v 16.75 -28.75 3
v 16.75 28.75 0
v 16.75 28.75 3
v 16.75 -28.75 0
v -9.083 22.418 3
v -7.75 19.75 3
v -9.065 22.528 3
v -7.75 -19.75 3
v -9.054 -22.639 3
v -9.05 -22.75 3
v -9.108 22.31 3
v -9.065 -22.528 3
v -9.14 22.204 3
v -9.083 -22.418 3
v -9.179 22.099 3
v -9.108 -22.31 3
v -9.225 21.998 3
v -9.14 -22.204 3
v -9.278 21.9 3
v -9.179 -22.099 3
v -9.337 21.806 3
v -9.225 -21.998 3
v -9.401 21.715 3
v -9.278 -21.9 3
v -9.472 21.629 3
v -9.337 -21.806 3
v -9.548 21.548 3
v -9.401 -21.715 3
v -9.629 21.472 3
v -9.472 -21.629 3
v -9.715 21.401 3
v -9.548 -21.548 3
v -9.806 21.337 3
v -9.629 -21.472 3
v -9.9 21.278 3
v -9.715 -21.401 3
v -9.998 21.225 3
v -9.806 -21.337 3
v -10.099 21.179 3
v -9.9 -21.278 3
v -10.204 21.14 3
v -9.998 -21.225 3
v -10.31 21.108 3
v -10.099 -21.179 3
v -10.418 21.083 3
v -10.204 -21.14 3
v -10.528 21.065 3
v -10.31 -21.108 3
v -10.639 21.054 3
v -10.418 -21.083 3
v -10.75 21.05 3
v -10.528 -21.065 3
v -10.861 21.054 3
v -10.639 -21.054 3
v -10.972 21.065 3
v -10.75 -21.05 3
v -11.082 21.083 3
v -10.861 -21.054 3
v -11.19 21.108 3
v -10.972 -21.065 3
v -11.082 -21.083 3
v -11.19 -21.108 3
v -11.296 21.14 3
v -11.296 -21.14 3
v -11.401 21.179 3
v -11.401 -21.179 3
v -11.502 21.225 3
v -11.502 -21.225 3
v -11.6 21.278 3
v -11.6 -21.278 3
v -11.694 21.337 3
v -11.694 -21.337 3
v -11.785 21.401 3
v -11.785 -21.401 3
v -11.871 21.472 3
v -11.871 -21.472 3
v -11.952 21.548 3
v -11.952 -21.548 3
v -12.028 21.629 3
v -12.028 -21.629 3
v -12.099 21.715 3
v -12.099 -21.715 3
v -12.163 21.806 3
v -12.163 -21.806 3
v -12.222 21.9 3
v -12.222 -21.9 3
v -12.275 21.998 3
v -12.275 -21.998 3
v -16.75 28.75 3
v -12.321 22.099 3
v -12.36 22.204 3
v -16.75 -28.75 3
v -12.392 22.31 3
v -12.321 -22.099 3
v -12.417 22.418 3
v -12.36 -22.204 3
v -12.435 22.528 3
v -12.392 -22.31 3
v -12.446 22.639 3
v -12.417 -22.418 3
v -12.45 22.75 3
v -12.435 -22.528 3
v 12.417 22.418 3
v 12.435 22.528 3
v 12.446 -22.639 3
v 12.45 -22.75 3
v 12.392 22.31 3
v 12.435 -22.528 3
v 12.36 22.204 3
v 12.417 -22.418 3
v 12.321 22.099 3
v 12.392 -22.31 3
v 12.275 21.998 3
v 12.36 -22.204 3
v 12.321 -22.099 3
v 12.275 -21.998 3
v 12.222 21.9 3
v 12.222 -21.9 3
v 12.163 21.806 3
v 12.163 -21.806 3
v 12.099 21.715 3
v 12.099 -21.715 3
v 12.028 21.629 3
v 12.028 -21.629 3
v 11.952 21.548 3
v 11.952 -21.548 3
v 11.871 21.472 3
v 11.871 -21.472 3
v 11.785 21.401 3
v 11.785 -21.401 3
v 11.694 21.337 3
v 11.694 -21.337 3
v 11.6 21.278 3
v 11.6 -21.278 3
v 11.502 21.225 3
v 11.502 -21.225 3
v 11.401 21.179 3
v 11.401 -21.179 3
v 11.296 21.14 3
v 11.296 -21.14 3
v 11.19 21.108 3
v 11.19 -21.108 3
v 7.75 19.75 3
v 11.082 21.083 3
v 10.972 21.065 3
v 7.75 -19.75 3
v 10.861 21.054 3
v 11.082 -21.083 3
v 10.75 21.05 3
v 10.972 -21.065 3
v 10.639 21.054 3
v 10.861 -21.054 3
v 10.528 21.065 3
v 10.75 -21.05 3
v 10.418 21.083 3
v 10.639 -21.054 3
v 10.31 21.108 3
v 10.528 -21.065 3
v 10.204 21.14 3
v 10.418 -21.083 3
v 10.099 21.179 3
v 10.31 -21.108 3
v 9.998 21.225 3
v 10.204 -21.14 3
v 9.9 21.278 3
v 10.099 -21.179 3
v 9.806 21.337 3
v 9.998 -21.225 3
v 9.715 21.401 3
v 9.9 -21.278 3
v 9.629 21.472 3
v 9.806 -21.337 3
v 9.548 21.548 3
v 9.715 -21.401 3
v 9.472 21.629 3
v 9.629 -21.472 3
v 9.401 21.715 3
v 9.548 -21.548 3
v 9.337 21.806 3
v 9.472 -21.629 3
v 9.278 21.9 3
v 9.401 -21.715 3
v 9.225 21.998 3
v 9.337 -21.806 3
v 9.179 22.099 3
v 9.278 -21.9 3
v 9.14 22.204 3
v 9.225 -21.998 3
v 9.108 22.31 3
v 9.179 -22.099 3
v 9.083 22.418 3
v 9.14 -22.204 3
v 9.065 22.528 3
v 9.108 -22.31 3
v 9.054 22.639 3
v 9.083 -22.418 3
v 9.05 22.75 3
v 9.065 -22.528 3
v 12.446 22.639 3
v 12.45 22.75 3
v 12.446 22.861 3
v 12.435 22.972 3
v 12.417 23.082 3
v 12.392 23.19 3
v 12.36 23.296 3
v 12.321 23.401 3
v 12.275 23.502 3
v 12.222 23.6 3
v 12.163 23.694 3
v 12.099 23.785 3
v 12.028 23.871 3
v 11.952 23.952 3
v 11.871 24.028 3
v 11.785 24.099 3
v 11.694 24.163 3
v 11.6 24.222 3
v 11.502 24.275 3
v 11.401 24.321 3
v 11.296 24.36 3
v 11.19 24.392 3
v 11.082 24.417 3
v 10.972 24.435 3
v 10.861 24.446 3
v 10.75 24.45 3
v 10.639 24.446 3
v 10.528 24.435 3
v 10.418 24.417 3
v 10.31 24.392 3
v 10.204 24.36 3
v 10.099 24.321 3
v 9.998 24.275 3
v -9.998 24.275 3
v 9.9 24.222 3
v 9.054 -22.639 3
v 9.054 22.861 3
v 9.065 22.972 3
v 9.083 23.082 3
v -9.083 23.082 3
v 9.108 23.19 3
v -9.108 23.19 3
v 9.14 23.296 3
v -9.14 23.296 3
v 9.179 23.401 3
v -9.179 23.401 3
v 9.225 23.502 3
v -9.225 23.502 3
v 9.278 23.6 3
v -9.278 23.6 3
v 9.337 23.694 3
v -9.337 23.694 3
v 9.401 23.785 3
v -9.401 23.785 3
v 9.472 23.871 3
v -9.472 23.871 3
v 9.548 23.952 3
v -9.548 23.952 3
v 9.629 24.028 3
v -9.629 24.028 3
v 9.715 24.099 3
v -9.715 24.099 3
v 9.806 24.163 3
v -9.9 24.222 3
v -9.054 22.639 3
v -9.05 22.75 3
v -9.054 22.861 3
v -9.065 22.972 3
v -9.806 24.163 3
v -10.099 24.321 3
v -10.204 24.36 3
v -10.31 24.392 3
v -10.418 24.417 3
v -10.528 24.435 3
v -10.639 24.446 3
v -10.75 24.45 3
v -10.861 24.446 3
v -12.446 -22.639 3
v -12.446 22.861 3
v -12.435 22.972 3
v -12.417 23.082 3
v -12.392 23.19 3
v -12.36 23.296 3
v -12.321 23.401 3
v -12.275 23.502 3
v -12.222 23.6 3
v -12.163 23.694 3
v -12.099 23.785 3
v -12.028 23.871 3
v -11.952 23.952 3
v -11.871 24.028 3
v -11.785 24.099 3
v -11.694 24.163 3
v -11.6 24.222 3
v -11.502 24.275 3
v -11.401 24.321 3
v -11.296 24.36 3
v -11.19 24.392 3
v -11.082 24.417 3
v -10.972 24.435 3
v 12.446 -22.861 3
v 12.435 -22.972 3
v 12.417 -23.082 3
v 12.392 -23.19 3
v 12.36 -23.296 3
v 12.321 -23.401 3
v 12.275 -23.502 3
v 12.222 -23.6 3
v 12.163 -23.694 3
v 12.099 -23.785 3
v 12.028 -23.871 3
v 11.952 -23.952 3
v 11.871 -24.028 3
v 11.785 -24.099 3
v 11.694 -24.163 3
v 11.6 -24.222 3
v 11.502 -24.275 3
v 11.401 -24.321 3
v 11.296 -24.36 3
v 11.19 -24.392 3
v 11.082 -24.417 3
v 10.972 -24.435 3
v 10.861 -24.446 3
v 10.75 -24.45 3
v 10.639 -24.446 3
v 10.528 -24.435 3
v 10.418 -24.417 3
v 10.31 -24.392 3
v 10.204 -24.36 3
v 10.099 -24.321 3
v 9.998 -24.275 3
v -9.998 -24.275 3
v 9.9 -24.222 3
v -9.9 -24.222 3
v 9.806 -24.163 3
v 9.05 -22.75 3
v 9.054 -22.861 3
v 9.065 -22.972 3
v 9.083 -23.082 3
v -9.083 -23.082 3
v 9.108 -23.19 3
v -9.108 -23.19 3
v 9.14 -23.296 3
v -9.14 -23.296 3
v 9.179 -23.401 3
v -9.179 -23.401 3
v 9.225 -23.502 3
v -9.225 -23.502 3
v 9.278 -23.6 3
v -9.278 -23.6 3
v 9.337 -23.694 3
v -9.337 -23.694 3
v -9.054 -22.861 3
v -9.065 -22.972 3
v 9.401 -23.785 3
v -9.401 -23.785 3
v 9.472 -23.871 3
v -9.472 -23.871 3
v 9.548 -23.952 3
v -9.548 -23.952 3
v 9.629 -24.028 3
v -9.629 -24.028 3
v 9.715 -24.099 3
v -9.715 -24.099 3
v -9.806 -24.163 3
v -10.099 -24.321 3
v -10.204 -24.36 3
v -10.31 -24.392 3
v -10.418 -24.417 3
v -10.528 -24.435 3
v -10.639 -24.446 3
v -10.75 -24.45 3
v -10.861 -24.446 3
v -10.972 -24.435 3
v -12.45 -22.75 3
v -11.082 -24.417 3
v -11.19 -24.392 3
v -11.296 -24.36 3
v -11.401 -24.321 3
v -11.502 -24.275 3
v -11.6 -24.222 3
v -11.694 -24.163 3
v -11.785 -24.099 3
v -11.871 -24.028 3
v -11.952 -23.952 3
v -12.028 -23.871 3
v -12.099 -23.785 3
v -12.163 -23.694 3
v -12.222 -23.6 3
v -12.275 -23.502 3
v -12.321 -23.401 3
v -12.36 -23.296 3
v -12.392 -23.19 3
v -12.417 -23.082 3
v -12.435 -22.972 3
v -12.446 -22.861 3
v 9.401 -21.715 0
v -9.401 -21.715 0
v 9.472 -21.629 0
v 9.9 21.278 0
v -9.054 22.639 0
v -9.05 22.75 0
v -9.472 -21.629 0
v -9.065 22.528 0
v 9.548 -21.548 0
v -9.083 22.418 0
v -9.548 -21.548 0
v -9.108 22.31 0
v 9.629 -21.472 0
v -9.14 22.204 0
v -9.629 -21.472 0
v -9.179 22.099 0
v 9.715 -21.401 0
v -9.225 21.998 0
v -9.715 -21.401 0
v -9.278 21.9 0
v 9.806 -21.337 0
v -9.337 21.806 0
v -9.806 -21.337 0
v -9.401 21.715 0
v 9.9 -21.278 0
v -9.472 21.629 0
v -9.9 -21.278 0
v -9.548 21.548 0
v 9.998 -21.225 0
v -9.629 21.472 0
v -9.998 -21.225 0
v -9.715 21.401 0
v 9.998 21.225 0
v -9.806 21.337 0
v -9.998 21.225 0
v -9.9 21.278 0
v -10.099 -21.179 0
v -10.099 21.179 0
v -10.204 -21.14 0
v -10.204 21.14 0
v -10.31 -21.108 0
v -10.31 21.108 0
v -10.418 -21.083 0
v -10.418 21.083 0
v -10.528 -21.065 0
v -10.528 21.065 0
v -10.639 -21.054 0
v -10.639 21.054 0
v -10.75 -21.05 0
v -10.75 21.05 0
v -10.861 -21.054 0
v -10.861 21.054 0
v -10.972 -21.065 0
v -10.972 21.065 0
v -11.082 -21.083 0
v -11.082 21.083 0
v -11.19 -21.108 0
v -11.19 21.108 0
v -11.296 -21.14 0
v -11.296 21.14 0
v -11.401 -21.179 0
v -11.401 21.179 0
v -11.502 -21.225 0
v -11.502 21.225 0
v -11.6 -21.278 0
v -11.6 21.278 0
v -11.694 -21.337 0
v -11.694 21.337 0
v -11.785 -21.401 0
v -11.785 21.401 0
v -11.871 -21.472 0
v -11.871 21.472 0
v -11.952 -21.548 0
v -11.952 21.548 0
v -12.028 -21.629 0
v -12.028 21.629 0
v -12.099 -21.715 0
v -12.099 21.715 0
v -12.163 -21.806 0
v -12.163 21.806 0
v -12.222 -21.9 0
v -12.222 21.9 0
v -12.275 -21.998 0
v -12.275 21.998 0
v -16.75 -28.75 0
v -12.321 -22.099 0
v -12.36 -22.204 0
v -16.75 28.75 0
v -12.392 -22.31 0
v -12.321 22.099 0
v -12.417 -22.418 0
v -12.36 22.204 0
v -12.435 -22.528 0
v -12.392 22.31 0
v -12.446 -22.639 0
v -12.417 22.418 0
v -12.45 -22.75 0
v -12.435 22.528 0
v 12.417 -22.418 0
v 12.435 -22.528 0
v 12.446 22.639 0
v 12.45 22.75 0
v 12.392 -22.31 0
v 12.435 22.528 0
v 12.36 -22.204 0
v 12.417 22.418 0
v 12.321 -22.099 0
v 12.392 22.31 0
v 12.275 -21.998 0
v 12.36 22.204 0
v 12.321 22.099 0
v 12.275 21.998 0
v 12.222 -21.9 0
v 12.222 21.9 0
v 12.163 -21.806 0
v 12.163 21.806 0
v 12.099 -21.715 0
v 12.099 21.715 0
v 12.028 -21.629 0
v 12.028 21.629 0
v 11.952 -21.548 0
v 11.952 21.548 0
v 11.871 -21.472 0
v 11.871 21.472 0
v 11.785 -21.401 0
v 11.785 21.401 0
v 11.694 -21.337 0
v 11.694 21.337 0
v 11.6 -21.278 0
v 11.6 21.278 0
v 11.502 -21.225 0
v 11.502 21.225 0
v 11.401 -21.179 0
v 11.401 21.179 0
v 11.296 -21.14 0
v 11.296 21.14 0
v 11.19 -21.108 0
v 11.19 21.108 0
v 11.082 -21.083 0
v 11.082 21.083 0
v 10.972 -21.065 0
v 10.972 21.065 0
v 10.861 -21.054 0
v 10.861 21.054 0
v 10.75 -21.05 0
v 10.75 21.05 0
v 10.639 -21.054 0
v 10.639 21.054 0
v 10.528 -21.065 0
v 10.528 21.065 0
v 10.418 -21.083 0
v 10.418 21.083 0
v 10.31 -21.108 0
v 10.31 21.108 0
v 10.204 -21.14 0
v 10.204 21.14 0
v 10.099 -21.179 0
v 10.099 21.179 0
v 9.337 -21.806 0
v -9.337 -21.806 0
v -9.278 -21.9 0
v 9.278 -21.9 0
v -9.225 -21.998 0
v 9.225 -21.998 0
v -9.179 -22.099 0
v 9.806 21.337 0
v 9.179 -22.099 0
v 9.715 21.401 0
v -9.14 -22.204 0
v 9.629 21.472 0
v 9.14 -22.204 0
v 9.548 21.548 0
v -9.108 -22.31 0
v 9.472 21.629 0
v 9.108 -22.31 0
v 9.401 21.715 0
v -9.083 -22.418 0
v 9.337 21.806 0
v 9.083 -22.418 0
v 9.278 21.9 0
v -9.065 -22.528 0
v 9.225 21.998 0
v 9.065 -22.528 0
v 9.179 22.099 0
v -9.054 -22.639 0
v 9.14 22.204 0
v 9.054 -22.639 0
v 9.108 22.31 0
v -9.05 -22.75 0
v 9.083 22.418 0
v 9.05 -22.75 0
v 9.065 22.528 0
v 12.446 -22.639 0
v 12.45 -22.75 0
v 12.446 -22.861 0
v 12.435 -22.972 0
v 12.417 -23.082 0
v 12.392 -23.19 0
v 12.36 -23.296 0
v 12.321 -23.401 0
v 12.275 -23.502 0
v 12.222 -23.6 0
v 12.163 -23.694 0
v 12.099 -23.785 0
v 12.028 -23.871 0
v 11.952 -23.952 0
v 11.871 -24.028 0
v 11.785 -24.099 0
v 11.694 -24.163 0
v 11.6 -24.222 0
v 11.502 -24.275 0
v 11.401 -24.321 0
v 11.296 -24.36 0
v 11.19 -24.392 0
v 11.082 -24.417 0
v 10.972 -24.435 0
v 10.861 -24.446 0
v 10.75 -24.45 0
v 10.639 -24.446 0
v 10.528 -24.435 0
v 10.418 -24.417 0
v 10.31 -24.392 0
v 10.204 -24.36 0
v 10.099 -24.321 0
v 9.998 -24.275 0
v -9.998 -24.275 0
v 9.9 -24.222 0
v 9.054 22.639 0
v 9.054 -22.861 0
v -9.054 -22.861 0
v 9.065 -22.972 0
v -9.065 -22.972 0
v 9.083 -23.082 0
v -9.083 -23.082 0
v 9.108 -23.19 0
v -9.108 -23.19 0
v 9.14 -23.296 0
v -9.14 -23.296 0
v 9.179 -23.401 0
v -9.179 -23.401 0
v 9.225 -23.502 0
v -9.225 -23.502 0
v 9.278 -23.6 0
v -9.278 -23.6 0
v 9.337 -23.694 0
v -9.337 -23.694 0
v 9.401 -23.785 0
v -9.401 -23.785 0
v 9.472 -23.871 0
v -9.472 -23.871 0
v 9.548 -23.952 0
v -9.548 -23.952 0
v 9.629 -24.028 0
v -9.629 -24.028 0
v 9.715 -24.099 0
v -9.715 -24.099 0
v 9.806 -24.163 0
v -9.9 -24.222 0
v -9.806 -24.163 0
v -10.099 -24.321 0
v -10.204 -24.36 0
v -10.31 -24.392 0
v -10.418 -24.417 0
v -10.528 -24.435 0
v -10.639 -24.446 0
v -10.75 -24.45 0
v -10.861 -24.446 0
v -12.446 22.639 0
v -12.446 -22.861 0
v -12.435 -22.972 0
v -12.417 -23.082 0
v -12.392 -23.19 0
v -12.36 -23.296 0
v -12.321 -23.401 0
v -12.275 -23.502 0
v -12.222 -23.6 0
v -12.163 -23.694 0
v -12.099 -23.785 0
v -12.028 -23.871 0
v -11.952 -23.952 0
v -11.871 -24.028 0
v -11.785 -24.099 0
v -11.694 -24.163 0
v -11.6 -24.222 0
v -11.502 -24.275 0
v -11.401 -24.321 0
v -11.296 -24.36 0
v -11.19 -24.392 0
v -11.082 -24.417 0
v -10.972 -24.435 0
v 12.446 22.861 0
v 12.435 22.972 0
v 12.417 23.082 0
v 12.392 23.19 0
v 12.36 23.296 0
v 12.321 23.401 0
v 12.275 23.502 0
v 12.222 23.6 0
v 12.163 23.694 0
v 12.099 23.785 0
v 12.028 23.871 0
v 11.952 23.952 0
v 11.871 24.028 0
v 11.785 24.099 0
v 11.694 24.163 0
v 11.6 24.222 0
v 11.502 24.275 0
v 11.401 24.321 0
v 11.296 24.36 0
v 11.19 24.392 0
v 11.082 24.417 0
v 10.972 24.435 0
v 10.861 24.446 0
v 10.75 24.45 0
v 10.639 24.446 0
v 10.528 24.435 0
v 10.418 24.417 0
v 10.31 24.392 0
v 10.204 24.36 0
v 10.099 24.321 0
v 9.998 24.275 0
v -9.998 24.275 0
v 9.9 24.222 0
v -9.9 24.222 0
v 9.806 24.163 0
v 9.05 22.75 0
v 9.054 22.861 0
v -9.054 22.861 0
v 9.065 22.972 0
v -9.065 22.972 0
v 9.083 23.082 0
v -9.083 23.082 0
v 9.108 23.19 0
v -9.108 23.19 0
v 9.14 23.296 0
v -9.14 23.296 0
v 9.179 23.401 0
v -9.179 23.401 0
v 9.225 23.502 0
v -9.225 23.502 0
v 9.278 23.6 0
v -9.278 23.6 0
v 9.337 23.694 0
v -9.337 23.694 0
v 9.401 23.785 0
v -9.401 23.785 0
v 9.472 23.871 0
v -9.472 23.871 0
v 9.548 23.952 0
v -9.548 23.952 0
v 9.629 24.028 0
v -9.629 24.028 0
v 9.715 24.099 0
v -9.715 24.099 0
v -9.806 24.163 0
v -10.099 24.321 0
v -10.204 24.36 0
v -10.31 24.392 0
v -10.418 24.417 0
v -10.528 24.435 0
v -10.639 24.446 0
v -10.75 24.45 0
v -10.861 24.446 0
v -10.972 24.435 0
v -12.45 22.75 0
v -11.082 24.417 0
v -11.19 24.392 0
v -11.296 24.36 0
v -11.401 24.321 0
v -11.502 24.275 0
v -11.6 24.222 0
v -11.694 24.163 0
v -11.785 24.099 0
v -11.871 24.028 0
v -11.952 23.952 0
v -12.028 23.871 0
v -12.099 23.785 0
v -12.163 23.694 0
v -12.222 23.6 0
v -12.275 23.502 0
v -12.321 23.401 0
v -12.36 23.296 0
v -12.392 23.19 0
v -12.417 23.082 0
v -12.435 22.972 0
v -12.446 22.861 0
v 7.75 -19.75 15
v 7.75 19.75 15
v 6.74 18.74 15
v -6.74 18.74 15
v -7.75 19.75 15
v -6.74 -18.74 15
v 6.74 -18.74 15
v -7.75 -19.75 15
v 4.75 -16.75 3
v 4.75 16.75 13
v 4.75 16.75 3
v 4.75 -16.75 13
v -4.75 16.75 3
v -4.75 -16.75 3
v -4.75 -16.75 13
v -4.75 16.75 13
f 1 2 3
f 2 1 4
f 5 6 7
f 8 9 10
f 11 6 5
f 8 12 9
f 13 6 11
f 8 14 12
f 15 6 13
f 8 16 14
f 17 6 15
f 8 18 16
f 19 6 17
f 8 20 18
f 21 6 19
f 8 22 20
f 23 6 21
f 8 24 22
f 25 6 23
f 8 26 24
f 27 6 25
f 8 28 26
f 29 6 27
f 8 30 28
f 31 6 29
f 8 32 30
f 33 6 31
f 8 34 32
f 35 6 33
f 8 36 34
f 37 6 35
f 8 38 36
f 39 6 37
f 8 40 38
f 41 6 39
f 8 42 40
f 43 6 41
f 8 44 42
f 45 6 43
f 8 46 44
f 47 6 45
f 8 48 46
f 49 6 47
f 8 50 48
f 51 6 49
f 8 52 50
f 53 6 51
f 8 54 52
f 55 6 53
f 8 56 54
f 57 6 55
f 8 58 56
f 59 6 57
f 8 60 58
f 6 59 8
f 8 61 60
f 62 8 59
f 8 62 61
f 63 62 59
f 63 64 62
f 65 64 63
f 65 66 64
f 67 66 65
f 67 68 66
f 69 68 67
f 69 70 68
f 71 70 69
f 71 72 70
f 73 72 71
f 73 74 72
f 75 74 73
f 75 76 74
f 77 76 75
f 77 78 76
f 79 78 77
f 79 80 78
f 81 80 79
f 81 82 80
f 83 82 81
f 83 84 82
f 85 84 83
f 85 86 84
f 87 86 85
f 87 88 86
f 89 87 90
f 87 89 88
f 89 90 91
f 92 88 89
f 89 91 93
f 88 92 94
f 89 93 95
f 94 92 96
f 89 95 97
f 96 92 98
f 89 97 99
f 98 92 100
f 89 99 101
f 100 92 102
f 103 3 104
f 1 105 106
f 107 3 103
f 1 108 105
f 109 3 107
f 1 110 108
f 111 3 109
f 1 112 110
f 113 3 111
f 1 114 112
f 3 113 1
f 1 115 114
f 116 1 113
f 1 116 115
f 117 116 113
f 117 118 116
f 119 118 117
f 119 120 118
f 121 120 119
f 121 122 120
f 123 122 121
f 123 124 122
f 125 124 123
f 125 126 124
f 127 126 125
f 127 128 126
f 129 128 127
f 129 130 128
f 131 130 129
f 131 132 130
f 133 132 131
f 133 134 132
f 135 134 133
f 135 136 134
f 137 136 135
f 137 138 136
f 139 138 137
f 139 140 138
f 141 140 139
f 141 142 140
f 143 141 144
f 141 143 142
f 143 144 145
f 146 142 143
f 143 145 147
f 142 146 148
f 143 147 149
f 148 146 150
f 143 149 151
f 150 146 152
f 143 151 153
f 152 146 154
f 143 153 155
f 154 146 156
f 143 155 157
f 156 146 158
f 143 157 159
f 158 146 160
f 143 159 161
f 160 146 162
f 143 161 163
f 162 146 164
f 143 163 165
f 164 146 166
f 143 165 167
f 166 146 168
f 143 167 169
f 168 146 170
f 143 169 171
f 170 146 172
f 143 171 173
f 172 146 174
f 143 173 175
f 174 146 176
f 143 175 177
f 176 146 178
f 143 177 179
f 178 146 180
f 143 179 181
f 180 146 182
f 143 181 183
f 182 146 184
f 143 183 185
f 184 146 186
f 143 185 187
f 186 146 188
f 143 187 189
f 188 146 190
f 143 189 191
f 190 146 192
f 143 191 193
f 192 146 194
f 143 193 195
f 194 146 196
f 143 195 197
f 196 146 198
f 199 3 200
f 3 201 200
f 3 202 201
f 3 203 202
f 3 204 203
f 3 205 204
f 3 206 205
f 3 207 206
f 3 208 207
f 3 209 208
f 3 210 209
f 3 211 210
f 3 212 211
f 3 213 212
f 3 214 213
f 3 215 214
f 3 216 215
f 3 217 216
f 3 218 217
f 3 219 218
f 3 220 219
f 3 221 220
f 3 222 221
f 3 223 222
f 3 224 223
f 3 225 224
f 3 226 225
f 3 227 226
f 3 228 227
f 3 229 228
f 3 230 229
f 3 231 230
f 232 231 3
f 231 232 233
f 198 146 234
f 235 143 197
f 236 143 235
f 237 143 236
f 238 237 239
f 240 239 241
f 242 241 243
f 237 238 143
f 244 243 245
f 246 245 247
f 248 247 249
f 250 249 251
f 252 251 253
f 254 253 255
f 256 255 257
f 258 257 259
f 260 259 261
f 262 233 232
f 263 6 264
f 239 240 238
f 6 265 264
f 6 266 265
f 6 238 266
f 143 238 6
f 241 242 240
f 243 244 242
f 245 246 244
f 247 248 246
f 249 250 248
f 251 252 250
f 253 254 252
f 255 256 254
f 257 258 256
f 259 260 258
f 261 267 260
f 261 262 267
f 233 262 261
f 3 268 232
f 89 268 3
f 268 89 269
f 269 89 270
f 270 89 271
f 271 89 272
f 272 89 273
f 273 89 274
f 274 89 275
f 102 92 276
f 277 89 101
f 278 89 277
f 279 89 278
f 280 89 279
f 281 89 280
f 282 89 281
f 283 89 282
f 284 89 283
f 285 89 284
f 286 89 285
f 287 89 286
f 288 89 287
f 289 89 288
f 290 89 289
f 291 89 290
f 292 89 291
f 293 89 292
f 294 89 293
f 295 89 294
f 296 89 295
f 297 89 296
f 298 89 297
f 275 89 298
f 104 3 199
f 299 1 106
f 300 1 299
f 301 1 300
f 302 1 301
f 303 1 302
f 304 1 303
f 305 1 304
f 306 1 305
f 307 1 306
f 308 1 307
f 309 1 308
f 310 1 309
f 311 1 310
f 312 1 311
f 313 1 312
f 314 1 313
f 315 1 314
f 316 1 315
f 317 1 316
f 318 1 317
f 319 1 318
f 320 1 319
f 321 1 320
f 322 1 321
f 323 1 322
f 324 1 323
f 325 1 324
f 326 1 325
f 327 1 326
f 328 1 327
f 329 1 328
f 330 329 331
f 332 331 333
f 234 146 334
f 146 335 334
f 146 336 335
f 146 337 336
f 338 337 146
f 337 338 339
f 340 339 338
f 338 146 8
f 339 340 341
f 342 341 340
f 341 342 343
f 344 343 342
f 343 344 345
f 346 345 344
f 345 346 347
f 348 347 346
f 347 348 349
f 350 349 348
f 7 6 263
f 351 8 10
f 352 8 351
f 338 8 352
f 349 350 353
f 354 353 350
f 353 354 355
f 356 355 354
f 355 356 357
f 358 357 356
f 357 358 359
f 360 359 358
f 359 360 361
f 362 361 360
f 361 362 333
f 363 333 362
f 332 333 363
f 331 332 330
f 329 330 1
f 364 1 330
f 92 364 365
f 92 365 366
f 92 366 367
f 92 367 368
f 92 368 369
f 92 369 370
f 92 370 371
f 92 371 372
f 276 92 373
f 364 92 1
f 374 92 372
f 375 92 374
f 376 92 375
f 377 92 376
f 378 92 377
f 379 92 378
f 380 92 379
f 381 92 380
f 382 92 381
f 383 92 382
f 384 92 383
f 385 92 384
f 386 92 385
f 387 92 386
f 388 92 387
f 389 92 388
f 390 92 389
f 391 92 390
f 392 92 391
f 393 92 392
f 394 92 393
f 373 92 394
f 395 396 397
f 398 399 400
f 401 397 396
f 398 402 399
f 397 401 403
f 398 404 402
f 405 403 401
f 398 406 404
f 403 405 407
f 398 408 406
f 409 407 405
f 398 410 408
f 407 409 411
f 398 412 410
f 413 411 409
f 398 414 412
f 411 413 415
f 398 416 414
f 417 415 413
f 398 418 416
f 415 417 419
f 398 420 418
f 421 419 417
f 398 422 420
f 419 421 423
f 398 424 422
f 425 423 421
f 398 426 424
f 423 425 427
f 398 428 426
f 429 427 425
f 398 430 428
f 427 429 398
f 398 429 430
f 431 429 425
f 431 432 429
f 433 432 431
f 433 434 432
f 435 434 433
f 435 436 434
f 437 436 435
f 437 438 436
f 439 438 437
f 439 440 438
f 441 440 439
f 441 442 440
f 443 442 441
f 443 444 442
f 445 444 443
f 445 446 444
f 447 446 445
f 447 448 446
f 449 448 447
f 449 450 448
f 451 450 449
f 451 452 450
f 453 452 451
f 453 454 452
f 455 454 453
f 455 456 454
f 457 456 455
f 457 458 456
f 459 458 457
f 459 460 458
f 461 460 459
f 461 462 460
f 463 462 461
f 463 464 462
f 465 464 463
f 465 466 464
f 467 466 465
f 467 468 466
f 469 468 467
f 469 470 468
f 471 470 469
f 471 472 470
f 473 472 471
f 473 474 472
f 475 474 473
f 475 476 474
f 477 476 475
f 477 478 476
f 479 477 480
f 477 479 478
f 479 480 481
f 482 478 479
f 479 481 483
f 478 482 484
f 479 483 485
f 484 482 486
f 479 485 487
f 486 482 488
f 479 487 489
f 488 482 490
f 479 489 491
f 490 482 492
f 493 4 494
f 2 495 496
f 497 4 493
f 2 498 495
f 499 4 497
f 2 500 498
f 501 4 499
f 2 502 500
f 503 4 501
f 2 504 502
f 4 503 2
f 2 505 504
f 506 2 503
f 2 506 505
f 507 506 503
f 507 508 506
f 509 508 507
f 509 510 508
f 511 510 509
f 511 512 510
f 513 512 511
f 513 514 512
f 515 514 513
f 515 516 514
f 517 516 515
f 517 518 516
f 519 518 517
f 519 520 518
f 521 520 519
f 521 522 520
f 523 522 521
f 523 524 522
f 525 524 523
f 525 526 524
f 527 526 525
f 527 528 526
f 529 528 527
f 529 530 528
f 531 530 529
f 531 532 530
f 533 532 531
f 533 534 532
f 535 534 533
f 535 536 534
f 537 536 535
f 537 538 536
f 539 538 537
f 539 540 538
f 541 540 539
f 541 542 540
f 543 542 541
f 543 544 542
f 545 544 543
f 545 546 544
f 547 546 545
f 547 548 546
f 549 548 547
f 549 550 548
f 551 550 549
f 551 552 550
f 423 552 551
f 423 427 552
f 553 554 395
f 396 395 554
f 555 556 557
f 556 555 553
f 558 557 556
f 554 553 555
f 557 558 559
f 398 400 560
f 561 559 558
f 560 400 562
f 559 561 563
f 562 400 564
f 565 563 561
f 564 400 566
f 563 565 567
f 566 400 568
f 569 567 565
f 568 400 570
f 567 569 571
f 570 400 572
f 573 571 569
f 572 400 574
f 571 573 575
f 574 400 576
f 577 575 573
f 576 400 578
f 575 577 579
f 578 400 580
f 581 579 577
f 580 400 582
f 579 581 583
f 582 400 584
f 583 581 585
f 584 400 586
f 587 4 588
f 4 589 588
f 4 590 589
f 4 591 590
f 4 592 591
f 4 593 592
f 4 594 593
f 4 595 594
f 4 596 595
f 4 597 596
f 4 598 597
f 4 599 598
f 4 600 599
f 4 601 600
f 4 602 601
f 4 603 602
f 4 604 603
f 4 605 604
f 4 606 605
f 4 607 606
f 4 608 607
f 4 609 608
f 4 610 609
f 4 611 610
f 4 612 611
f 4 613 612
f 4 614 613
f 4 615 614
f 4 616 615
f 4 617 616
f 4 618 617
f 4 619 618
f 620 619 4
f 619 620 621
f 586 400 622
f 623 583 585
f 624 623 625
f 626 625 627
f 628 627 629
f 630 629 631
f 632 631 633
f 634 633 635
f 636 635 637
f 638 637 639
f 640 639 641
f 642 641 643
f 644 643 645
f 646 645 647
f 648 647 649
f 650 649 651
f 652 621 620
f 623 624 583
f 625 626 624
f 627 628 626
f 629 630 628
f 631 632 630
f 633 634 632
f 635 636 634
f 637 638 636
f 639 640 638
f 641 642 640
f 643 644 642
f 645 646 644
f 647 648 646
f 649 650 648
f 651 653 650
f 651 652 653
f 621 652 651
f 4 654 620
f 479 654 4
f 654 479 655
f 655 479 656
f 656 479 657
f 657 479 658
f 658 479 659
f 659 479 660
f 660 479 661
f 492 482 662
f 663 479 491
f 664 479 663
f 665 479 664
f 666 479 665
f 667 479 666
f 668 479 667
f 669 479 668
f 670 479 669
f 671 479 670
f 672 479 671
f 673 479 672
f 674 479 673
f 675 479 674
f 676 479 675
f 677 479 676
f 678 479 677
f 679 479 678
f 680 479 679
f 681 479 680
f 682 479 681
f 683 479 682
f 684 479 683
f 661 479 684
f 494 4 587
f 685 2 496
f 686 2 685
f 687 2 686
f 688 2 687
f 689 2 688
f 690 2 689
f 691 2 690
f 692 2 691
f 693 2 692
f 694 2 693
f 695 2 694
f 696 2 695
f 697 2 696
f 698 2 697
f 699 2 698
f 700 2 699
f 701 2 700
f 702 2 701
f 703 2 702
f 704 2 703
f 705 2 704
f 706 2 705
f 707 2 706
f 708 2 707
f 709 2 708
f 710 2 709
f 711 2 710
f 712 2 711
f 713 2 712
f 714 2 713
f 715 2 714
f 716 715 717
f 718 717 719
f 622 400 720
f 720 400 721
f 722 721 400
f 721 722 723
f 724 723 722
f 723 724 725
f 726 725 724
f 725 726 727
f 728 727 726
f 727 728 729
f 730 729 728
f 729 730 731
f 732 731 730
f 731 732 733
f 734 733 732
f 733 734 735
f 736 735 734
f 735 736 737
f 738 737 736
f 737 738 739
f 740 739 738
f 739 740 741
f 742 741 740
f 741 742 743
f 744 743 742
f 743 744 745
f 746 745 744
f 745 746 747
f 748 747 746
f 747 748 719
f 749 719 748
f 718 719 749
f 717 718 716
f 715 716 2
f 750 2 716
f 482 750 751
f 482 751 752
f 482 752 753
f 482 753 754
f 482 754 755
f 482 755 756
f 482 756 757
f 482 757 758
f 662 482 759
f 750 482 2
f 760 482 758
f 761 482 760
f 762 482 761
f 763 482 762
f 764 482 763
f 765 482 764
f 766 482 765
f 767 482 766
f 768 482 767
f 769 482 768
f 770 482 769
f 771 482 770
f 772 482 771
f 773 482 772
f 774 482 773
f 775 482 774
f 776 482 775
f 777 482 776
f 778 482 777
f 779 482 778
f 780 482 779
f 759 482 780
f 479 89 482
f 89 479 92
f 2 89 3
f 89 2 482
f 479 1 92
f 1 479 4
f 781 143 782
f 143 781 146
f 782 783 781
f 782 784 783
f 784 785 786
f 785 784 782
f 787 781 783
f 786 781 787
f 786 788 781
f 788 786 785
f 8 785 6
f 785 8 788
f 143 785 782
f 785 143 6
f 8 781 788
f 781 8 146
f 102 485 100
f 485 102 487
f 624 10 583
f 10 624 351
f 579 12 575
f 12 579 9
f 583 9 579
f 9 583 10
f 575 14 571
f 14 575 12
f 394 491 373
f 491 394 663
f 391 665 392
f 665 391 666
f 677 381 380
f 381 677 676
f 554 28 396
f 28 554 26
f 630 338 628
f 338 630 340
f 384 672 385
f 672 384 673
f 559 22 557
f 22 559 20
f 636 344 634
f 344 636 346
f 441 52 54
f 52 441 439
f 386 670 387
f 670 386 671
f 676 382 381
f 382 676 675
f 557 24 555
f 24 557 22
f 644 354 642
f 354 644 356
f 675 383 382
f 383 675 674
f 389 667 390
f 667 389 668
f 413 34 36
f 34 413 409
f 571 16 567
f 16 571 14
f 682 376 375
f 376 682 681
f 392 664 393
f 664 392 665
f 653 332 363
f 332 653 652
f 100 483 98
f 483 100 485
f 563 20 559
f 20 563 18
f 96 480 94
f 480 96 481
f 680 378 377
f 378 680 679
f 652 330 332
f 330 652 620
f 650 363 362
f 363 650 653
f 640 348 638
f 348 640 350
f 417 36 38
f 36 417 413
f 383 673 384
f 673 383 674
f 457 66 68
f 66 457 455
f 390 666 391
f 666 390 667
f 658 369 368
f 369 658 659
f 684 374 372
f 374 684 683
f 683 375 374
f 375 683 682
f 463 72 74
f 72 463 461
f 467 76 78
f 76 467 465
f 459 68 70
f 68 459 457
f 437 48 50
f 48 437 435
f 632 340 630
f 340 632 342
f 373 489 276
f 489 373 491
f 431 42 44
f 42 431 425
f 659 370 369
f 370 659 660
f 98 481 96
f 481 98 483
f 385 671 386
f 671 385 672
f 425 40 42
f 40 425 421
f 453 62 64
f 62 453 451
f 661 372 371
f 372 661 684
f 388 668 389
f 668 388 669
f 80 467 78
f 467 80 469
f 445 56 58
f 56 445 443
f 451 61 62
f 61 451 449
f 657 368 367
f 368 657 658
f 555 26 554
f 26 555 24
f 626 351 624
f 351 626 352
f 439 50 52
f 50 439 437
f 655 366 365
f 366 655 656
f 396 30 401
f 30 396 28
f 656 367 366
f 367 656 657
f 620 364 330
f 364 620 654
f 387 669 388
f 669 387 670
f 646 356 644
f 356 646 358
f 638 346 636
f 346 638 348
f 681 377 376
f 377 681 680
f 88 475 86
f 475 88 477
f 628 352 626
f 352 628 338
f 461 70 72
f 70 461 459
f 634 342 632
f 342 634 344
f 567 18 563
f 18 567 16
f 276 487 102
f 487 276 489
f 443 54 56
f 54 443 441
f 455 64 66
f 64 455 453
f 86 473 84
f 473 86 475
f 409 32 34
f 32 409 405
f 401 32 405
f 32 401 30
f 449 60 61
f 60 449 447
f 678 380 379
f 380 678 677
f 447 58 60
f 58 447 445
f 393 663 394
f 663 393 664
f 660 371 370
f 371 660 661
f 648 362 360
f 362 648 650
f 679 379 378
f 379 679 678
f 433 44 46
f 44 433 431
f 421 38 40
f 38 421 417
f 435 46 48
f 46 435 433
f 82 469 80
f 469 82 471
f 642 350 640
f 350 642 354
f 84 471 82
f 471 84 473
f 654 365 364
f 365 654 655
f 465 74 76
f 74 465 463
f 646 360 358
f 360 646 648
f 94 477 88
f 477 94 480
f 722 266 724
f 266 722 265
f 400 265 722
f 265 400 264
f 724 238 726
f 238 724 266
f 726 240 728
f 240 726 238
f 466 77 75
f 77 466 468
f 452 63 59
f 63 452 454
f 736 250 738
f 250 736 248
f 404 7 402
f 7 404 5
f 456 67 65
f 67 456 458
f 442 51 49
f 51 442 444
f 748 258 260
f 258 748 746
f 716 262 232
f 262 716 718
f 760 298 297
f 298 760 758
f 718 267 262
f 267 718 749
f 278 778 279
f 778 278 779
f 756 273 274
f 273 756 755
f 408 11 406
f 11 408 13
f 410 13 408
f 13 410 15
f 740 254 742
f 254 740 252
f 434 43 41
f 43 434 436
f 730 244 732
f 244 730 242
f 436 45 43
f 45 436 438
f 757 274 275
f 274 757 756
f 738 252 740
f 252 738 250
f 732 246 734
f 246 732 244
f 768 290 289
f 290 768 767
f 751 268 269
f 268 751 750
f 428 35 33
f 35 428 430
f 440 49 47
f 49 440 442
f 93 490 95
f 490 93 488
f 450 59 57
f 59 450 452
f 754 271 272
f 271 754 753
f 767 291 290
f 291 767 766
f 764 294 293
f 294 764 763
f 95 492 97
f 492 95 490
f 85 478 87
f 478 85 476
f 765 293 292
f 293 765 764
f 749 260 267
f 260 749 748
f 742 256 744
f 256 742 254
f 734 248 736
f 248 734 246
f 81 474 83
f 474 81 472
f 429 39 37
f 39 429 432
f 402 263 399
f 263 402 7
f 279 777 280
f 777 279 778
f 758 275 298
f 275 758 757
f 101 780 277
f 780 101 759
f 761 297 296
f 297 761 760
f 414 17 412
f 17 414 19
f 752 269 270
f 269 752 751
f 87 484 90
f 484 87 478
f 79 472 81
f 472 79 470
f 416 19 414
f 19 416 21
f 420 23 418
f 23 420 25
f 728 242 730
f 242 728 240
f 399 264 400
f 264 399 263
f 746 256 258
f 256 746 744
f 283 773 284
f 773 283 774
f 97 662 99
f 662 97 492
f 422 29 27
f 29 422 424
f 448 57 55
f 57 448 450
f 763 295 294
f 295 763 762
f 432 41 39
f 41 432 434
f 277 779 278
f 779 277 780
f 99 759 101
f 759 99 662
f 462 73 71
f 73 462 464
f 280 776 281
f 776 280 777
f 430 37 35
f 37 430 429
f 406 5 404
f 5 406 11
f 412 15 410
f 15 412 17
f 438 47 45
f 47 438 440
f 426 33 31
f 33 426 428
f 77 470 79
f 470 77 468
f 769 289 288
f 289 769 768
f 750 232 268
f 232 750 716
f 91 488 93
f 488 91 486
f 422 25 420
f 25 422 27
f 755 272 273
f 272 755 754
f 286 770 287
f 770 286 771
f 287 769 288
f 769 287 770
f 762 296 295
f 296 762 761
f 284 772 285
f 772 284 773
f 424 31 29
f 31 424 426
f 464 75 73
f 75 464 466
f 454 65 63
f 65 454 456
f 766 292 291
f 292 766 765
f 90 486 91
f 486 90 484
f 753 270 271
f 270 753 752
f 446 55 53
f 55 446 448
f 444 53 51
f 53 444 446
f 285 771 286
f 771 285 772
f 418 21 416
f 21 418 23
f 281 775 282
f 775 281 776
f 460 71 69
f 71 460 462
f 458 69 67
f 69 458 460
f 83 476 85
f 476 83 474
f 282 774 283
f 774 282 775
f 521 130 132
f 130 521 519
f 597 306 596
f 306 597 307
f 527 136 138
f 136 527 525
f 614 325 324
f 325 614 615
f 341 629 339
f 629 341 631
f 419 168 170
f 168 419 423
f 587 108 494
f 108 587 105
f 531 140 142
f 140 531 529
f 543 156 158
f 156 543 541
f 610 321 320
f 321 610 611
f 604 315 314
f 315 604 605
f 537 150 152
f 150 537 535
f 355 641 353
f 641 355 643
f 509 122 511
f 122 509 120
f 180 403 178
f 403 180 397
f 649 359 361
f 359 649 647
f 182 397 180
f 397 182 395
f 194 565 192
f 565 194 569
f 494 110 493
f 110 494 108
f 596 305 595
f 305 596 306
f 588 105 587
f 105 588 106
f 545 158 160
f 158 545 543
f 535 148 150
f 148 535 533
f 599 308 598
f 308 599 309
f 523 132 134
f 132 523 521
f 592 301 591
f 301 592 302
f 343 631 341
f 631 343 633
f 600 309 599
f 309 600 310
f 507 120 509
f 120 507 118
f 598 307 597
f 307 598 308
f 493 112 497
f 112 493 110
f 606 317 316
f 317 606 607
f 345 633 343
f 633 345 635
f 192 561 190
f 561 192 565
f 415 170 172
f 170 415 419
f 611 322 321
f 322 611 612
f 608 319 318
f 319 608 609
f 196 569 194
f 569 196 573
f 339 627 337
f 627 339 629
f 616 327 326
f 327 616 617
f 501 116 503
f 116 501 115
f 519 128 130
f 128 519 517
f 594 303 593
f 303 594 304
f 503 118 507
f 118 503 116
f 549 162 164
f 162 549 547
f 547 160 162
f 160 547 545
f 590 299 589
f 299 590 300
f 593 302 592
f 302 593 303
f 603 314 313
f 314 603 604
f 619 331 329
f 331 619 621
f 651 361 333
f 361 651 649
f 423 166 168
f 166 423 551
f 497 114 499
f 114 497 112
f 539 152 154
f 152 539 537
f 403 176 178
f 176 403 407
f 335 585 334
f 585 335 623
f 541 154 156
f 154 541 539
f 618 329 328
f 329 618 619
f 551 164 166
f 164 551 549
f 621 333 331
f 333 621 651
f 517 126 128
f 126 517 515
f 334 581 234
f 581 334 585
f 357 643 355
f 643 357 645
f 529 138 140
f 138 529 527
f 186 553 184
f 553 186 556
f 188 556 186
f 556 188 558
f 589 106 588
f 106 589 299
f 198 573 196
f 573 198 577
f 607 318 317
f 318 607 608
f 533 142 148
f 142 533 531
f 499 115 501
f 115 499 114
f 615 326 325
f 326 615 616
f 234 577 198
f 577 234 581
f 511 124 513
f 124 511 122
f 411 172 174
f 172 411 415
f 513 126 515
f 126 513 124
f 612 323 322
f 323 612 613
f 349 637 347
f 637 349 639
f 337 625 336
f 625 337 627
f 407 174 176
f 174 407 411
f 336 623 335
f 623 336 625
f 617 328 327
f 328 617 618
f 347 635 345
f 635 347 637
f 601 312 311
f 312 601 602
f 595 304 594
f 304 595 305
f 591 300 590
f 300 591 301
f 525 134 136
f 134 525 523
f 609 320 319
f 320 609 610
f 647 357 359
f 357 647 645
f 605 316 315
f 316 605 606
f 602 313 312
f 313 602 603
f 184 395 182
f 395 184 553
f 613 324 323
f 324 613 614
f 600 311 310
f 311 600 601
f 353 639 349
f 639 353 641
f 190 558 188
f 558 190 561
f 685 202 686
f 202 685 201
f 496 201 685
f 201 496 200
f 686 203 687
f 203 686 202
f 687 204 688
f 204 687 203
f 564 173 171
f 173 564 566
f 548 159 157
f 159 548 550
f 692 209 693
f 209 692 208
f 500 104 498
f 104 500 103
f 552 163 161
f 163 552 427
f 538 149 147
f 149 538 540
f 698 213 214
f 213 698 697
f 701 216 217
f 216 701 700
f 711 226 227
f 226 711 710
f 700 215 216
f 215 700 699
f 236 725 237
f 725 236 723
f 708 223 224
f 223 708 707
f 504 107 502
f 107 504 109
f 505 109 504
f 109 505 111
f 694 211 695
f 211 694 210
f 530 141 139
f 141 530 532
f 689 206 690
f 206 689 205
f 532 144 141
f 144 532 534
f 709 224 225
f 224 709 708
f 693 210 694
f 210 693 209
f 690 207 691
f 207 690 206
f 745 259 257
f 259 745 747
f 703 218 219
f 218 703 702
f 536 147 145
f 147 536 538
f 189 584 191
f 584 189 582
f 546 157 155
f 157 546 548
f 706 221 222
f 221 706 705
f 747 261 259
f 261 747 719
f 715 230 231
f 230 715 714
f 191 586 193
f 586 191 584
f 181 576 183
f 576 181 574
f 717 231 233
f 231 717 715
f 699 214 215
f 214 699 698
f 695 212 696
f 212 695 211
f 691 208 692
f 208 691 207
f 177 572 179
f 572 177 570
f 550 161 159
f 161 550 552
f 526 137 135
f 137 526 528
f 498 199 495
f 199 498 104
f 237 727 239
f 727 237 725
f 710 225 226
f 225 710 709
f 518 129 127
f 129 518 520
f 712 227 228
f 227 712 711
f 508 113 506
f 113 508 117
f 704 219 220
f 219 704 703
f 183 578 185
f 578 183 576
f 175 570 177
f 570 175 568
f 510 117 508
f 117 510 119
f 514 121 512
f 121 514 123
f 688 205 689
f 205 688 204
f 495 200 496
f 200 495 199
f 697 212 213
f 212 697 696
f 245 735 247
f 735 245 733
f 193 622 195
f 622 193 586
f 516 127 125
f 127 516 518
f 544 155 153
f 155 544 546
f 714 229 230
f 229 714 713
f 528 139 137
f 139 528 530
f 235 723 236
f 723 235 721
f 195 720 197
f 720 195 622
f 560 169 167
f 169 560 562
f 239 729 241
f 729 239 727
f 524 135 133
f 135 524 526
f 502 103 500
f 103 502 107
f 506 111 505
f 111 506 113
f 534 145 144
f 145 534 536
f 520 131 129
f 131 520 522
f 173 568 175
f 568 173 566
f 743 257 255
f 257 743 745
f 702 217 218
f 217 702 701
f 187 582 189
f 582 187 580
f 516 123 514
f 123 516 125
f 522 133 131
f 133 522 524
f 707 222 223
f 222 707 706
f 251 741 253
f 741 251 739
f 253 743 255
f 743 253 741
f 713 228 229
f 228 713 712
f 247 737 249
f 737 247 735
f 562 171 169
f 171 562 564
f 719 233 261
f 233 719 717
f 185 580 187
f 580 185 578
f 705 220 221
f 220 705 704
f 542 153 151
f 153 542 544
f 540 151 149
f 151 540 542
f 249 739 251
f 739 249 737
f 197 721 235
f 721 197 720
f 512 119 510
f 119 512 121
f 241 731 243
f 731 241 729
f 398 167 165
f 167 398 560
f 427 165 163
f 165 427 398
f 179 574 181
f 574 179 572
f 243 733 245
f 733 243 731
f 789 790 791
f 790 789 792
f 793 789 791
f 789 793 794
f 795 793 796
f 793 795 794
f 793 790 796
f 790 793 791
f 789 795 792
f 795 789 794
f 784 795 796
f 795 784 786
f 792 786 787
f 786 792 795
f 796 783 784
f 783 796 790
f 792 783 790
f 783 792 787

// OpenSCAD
// =============================================================
//  connect_four_piece_edge_nest.scad
//  Stage-1 "edge nest" piece holder for the Connect Four robot arm
//
//  WHY THIS EXISTS (vs. the other fixtures in this folder)
//  -------------------------------------------------------
//  tray / chute / magazine all hold the disc FLAT and grip its RIM,
//  which leaves the disc horizontal after pickup -> a 90 deg wrist
//  rotation is then needed to drop it into a vertical board slot
//  (the "wrist rotation direction" question parked in column_mover.py).
//
//  This nest holds ONE disc STANDING ON EDGE. The gripper descends
//  from straight above and clamps the two flat faces across the
//  8.5 mm thickness (the "narrow" grip). The disc comes up already
//  vertical, hanging edge-down, and drops straight into the column.
//  No reorientation.
//
//        gripper jaws close along X (across the 8.5 mm thickness)
//                 │            │
//                 ▼            ▼
//              ┌────┐  ●●●  ┌────┐    ● = exposed upper faces (grip here)
//              │    │ ●███● │    │
//   side walls │    │ █████ │    │    cradle only the LOWER ~12 mm so the
//   (cut low)  └────┘ █████ └────┘    jaws clear the walls
//   ───────────────────────────────  floor (disc rests on its edge here)
//
//  STAGE 1 = THIS FILE: a single nest, hand-reloaded between episodes.
//  Fixed pickup pose -> ideal for recording the first ACT dataset.
//  STAGE 2 (later): bolt an inclined feed channel onto the back so the
//  next disc auto-feeds. Parameters here are named to make that easy.
//
//  HOW TO USE
//  ----------
//  1. Open in OpenSCAD. F5 (preview) — read the echoed footprint,
//     grip-exposure, and pickup-pose numbers in the console.
//  2. F6 (render) -> File > Export > Export as STL.
//  3. Print in PLA. Print "as drawn" (open side up) — no supports
//     needed; the chamfers are self-supporting at 45 deg.
//  4. Bolt to the bench through the 4 mounting holes. A fixed XY/Z
//     pose is critical: you teach the pickup pose ONCE, then every
//     recorded episode reuses it.
//
//  ORIENTATION ON THE BENCH
//  ------------------------
//  The gripper closes along X. Set the nest so X is PERPENDICULAR to
//  the Connect Four board face — then the lifted disc's plane is
//  already parallel to the board slot and no wrist roll is required
//  between pick and place.
//
//  DISC DIMENSIONS: measured 2026-05-01 (see connect_four_piece_tray.scad)
// =============================================================

/* ── USER PARAMETERS ──────────────────────────────────────── */

// Measured disc (calipers). Update if your set differs.
piece_d        = 32.0;   // disc diameter  (mm)
piece_t        = 8.5;    // disc thickness (mm)  <- this is the gripped dimension

// Slot fit
slot_clearance = 1.0;    // TOTAL extra across thickness (0.5 mm/side).
                         // Tight on purpose: disc must stand vertical and
                         // land in a repeatable pose. Loosen to ~1.5 if
                         // your printer runs tight and the disc binds.
diam_clearance = 1.5;    // TOTAL extra along the diameter (front/back),
                         // so the disc drops in without jamming.

// Cradle / walls
cradle_h       = 12.0;   // how high the walls hug the disc (mm).
                         // MUST stay well below piece_d so the upper faces
                         // are exposed for the jaws. See grip-exposure echo.
wall_t         = 3.0;    // wall thickness (mm)
floor_t        = 3.0;    // floor thickness below the disc (mm)

// Self-centering chamfer on the top inner edges (funnels the disc on
// reload and funnels the jaws on approach). Kept <= wall_t so a solid
// lip remains at the top outer edge.
chamfer        = 2.0;    // 45 deg chamfer leg (mm)

// Mounting (bolt-down)
mount_hole_d   = 3.4;    // clearance for M3 (mm)
mount_inset    = 6.0;    // hole center inset from the base edge (mm)
base_margin    = 9.0;    // base plate overhang around the cradle (mm)
                         // -> gives room for the mounting holes

// Gripper reality-check (for the echo only; not geometry).
// SO-101 stock parallel jaw: set your measured numbers to get a warning
// if the design asks for more than the gripper can do.
jaw_max_open   = 40.0;   // max jaw opening (mm)  <- MEASURE yours
finger_len     = 20.0;   // finger pad length (mm) <- MEASURE yours

/* ── DERIVED — do not edit below ─────────────────────────────*/
$fn = 96;

slot_w   = piece_t + slot_clearance;          // inner channel width (X)
inner_l  = piece_d + diam_clearance;          // inner length front/back (Y)

cradle_outer_w = slot_w + 2 * wall_t;         // X outer of the cradle box
cradle_outer_l = inner_l + 2 * wall_t;        // Y outer of the cradle box
wall_top_z     = floor_t + cradle_h;          // top of the cradle walls

base_w = cradle_outer_w + 2 * base_margin;    // X of base plate
base_l = cradle_outer_l + 2 * base_margin;    // Y of base plate

disc_top_z   = floor_t + piece_d;             // top of the disc above table
exposed_h    = disc_top_z - wall_top_z;       // exposed face height for jaws
grip_center_z = (wall_top_z + disc_top_z) / 2; // suggested jaw-center height

/* ── SANITY ECHOES ───────────────────────────────────────────*/
echo(str("═══ Edge-nest footprint: ", base_w, " × ", base_l,
         " × ", wall_top_z, " mm ═══"));
echo(str("    Slot (X) inner width: ", slot_w,
         " mm   Cradle length (Y): ", inner_l, " mm"));
echo(str("    Disc top: ", disc_top_z, " mm   Wall top: ", wall_top_z,
         " mm   -> exposed grip height: ", exposed_h, " mm"));
echo(str("    Suggested jaw-center Z (above table): ", grip_center_z, " mm"));
echo(str("    Grip span needed: ", piece_t, " mm   (jaw max open ",
         jaw_max_open, " mm -> ",
         (piece_t < jaw_max_open) ? "OK" : "TOO WIDE", ")"));
echo(str("    Exposed grip height ", exposed_h, " mm vs finger length ",
         finger_len, " mm -> ",
         (exposed_h >= 8) ? "OK (>=8 mm of face to grip)"
                          : "LOW — lower cradle_h for more grip"));

/* ── MODULES ──────────────────────────────────────────────── */

// Self-centering funnel: flares the slot opening outward by `chamfer`
// on all four sides over the top `chamfer` mm of wall. Built as the hull
// of a narrow rectangle (slot cross-section, lower) and a wider rectangle
// (slot + 2*chamfer, at the lip) -> a clean 45 deg funnel on every edge.
module slot_funnel() {
    hull() {
        translate([0, 0, wall_top_z - chamfer])
            linear_extrude(0.01)
                square([slot_w, inner_l], center = true);
        translate([0, 0, wall_top_z + 0.01])
            linear_extrude(0.01)
                square([slot_w + 2*chamfer, inner_l + 2*chamfer], center = true);
    }
}

module mount_holes() {
    for (sx = [-1, 1], sy = [-1, 1])
        translate([sx * (base_w/2 - mount_inset),
                   sy * (base_l/2 - mount_inset),
                   -0.01])
            cylinder(h = floor_t + 0.02, d = mount_hole_d);
}

/* ── NEST ─────────────────────────────────────────────────── */
module edge_nest() {
    difference() {
        union() {
            // Base plate
            translate([-base_w/2, -base_l/2, 0])
                cube([base_w, base_l, floor_t]);
            // Cradle box (walls), centered on origin in XY
            translate([-cradle_outer_w/2, -cradle_outer_l/2, 0])
                cube([cradle_outer_w, cradle_outer_l, wall_top_z]);
        }

        // Hollow the standing-disc slot (open top), from just above the
        // floor up through the top so the disc rests on the floor.
        translate([-slot_w/2, -inner_l/2, floor_t])
            cube([slot_w, inner_l, wall_top_z]);  // through the top

        // Self-centering funnel on the four top inner edges
        slot_funnel();

        // Mounting holes
        mount_holes();
    }
}

/* ── RENDER ───────────────────────────────────────────────── */
edge_nest();

// Optional: drop a translucent disc in place to eyeball the grip.
// Uncomment to preview (F5). The disc stands on edge in the slot.
//
// %translate([0, 0, floor_t + piece_d/2])
//     rotate([0, 90, 0])
//         cylinder(h = piece_t, d = piece_d, center = true, $fn = 96);
